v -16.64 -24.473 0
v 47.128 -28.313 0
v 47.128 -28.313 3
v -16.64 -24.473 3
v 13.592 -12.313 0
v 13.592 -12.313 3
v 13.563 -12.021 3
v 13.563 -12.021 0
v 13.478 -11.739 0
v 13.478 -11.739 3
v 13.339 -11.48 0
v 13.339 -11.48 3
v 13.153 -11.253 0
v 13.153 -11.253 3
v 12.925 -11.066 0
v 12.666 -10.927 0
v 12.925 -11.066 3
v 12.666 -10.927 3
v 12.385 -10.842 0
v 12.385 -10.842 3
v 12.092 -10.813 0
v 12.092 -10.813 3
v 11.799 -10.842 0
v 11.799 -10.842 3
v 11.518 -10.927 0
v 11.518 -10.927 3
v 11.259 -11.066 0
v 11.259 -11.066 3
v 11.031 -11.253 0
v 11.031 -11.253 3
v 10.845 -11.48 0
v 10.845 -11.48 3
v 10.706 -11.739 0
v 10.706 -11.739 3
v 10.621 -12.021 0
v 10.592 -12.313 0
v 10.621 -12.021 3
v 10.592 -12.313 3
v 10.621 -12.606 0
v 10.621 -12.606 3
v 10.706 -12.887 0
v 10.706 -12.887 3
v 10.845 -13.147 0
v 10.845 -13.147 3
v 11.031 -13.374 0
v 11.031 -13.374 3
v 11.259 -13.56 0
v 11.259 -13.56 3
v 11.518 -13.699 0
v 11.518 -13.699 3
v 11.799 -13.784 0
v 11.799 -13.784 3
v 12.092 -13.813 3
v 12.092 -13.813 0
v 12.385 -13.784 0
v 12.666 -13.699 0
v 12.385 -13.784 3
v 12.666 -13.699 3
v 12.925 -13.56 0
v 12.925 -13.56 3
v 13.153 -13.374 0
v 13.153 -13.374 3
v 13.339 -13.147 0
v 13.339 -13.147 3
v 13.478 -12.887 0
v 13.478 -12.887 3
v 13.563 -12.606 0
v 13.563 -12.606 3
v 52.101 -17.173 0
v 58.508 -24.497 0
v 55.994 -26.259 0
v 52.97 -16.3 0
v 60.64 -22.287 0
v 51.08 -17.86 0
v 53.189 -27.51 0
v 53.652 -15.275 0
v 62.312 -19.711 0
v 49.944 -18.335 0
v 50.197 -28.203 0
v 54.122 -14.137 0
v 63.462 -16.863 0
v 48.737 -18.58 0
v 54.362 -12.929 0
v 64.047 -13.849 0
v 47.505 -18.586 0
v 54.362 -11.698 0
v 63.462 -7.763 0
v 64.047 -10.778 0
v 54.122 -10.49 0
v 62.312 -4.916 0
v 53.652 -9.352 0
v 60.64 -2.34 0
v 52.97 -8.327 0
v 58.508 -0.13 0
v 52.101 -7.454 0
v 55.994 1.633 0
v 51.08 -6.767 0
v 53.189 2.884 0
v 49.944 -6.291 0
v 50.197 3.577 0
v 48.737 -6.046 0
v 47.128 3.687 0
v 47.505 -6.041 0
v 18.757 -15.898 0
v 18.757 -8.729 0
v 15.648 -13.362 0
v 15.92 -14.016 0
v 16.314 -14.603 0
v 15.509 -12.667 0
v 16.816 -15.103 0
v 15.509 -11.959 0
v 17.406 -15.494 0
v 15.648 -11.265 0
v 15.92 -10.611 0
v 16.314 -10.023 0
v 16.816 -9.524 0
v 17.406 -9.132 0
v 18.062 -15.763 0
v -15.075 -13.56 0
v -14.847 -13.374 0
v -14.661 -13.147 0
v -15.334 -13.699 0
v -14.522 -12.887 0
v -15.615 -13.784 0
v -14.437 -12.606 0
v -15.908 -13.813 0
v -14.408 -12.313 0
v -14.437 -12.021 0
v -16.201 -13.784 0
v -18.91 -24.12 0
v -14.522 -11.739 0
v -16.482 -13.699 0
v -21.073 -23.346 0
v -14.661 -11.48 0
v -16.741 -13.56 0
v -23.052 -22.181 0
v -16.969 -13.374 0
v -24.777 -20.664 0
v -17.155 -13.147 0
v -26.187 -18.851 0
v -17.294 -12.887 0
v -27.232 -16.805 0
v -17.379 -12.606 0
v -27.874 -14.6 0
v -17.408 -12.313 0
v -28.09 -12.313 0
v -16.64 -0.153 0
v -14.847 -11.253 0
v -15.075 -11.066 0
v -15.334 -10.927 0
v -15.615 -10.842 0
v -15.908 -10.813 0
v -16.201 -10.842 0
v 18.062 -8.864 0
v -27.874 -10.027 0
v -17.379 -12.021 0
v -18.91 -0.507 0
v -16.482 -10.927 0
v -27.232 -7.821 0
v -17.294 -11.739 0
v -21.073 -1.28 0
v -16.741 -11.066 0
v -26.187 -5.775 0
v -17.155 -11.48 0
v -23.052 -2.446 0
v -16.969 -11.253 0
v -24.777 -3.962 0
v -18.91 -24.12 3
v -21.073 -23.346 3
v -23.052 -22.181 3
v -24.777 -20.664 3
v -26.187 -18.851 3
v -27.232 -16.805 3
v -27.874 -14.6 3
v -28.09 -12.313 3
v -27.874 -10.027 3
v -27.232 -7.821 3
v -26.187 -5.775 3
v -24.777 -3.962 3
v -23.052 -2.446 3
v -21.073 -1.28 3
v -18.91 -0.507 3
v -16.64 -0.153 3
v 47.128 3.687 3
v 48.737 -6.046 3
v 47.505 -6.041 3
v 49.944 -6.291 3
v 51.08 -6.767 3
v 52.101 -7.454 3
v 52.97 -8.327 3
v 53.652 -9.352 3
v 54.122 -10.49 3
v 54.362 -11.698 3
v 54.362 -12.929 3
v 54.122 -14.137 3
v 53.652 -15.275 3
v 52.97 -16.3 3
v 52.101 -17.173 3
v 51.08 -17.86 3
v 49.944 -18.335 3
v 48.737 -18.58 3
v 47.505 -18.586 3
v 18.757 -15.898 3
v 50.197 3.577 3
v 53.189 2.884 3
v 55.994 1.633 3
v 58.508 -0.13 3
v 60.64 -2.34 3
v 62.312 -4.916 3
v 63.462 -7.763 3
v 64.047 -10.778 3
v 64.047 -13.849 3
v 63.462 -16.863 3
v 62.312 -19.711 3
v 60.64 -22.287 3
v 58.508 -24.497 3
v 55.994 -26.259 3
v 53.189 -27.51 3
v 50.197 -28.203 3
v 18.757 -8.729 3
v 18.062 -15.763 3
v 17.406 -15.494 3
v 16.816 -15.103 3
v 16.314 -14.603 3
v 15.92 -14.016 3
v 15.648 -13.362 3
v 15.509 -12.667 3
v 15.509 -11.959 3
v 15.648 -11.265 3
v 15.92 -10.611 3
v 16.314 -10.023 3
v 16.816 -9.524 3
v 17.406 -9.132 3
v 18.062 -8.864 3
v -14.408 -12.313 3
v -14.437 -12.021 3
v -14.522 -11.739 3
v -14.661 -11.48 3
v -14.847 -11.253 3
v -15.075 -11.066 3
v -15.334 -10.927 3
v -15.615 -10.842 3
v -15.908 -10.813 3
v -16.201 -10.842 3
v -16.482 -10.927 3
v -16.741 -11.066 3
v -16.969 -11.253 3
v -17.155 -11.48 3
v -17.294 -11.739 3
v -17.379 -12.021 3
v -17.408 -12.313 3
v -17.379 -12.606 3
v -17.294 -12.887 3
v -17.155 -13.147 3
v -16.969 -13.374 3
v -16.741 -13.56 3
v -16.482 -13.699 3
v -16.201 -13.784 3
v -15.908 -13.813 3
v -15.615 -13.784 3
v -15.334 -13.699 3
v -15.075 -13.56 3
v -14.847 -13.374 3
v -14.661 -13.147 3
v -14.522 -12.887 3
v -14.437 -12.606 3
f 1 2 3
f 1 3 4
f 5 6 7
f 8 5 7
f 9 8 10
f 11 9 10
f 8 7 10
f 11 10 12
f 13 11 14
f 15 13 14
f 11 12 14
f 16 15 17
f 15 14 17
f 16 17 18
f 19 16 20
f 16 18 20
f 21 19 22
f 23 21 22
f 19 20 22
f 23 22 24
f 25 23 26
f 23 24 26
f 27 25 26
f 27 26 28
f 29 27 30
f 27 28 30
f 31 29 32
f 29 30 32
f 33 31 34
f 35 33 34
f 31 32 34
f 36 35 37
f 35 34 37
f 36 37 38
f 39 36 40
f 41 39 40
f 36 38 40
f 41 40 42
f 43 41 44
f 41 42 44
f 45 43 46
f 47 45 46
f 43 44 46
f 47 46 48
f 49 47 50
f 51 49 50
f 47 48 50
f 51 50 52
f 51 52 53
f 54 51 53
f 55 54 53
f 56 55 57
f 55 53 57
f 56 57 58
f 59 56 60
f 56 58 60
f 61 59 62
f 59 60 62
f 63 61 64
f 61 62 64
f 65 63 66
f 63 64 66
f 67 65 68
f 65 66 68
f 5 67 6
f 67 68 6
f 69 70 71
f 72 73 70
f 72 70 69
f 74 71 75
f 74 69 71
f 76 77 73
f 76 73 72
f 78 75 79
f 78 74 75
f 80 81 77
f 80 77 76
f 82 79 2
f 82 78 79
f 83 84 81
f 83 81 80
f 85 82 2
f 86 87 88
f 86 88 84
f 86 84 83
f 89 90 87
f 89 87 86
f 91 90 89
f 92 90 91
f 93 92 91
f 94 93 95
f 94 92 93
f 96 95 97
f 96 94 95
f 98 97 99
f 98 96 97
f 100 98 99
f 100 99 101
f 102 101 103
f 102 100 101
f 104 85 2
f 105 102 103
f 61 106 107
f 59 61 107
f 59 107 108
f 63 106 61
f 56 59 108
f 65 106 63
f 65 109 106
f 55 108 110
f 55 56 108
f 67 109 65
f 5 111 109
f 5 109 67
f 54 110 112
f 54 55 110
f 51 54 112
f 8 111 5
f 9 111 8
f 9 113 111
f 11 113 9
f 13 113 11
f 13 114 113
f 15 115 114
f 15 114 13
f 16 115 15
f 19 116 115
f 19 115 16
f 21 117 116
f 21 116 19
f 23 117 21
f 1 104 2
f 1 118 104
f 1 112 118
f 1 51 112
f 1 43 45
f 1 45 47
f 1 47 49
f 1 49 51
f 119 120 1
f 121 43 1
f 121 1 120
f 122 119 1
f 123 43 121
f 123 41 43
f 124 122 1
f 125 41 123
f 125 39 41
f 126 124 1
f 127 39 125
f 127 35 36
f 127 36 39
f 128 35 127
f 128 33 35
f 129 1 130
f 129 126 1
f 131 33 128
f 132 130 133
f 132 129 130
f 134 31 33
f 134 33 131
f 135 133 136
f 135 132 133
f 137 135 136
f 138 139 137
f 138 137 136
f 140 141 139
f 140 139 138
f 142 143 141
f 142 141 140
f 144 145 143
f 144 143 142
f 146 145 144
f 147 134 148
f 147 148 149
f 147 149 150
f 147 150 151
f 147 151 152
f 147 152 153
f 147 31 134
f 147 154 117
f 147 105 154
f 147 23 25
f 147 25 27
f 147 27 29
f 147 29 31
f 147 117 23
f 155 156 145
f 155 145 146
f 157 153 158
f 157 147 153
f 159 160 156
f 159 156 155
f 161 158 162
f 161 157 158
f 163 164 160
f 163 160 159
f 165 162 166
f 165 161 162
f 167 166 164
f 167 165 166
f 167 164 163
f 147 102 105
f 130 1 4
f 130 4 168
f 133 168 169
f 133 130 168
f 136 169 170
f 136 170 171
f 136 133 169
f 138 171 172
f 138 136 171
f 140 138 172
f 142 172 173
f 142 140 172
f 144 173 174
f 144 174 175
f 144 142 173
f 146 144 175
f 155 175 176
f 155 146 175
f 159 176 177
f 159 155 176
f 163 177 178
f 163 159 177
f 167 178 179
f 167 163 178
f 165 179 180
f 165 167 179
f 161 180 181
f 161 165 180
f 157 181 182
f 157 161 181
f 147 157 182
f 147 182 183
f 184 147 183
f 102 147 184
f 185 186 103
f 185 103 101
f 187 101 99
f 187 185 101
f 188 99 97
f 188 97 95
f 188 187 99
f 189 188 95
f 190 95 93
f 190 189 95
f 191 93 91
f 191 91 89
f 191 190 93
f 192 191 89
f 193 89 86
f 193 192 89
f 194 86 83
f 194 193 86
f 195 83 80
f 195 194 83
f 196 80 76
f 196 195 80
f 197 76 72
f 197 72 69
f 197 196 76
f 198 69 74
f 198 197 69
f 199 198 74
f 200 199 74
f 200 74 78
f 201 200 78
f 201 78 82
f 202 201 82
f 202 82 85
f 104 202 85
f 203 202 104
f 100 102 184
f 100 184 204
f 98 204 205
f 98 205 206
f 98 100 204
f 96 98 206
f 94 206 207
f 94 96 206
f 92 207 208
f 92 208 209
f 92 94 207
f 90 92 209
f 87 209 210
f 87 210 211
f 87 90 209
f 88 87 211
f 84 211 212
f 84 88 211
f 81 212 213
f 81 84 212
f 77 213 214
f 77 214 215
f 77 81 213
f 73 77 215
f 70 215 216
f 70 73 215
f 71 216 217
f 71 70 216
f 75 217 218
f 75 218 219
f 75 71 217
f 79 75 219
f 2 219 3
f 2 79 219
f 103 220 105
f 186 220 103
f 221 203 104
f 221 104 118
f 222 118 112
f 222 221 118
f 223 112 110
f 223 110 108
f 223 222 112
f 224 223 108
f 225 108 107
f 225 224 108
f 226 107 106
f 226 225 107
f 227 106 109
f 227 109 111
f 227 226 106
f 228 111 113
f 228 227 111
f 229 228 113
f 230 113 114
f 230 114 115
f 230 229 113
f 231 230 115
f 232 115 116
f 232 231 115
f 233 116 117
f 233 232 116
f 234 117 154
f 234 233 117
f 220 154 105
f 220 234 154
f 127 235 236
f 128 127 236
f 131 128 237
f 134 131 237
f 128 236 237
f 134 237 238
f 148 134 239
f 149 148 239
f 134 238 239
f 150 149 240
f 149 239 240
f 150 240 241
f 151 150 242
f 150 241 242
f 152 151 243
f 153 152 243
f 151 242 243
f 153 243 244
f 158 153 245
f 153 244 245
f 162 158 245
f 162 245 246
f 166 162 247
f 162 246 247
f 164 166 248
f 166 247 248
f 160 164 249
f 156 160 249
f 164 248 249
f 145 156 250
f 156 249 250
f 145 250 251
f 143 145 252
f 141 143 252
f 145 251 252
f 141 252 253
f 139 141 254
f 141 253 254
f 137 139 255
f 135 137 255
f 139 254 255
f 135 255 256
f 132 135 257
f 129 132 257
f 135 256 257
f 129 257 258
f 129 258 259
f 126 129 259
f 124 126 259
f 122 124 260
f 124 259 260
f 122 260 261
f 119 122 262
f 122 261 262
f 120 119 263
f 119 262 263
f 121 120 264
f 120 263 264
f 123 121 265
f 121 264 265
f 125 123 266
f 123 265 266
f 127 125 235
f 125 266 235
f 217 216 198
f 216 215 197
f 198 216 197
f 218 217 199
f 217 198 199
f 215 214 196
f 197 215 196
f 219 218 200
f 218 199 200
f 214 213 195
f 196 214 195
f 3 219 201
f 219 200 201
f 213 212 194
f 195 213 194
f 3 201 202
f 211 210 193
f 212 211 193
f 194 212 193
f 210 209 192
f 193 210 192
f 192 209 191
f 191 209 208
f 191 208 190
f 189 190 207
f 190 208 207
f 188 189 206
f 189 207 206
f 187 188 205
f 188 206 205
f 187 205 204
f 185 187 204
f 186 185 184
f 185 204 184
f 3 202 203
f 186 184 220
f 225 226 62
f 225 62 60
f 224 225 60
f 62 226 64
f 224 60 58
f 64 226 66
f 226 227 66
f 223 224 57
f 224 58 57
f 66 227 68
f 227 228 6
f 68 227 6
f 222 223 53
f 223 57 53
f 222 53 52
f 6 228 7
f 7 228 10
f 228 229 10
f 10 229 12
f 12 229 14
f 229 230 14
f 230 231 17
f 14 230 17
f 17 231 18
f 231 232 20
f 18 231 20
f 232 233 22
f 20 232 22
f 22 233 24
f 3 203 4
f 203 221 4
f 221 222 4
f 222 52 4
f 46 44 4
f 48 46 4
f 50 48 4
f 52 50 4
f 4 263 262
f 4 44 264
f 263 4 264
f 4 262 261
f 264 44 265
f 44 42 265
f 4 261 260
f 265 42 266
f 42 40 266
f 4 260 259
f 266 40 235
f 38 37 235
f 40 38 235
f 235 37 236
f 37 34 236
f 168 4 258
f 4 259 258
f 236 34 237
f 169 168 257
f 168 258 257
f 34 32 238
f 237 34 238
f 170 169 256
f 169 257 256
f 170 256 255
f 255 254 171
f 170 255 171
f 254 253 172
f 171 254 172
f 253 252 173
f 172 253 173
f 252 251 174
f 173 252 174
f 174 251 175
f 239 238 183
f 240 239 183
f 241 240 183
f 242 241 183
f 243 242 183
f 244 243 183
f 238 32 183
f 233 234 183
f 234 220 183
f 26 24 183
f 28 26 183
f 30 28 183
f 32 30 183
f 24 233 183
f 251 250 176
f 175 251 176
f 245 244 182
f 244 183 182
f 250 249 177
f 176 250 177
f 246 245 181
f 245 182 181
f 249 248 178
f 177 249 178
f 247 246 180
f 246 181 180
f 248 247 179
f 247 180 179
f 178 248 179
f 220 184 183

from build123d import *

# Parameters (mm, degrees)
BOSS_EXTRUDE1_DEPTH = 3
SKETCH2_R           = 1.5
CUT_EXTRUDE1_DEPTH  = 3
CUT_EXTRUDE2_DEPTH  = 3


with BuildPart() as part:
    # Sketch1 → Boss-Extrude1 (new body)
    with BuildSketch(Plane.XY):
        with BuildLine():
            Line((-52.51020312, -2.31327399), (47.128491464, 3.68672601))
            ThreePointArc((47.128491464, 3.68672601), (64.120955569, -12.31327399), (47.128491464, -28.31327399))
            Line((47.128491464, -28.31327399), (-52.51020312, -22.31327399))
            ThreePointArc((-52.51020312, -22.31327399), (-61.926141798, -12.31327399), (-52.51020312, -2.31327399))
        make_face()
    extrude(amount=BOSS_EXTRUDE1_DEPTH)

    # Sketch2 → Cut-Extrude1 (cut)
    with BuildSketch(Plane.XY.offset(3)):
        with Locations((12.091972574, -12.31327399)):
            Circle(SKETCH2_R)
        with Locations((-15.908027426, -12.31327399)):
            Circle(SKETCH2_R)
        with Locations((-51.908027426, -12.31327399)):
            Circle(SKETCH2_R)
        with BuildLine():
            Line((18.75680016, -8.728910804), (47.50542085, -6.040638414))
            ThreePointArc((47.50542085, -6.040638414), (54.391972574, -12.31327399), (47.50542085, -18.585909567))
            Line((47.50542085, -18.585909567), (18.75680016, -15.897637177))
            ThreePointArc((18.75680016, -15.897637177), (15.491972574, -12.31327399), (18.75680016, -8.728910804))
        make_face()
    extrude(amount=-CUT_EXTRUDE1_DEPTH, mode=Mode.SUBTRACT)

    # Sketch3 → Cut-Extrude2 (cut)
    with BuildSketch(Plane(origin=(0, 0, 0), x_dir=(-1, 0, 0), z_dir=(0, 0, -1))):
        with BuildLine():
            Line((16.640273069, -0.15327399), (68.701590892, -0.15327399))
            Line((68.701590892, -0.15327399), (68.701590892, -19.932639697))
            Line((68.701590892, -19.932639697), (68.701590892, -24.47327399))
            Line((68.701590892, -24.47327399), (16.640273069, -24.47327399))
            ThreePointArc((16.640273069, -24.47327399), (28.090054502, -12.31327399), (16.640273069, -0.15327399))
        make_face()
    extrude(amount=-CUT_EXTRUDE2_DEPTH, mode=Mode.SUBTRACT)


solid = part.part
